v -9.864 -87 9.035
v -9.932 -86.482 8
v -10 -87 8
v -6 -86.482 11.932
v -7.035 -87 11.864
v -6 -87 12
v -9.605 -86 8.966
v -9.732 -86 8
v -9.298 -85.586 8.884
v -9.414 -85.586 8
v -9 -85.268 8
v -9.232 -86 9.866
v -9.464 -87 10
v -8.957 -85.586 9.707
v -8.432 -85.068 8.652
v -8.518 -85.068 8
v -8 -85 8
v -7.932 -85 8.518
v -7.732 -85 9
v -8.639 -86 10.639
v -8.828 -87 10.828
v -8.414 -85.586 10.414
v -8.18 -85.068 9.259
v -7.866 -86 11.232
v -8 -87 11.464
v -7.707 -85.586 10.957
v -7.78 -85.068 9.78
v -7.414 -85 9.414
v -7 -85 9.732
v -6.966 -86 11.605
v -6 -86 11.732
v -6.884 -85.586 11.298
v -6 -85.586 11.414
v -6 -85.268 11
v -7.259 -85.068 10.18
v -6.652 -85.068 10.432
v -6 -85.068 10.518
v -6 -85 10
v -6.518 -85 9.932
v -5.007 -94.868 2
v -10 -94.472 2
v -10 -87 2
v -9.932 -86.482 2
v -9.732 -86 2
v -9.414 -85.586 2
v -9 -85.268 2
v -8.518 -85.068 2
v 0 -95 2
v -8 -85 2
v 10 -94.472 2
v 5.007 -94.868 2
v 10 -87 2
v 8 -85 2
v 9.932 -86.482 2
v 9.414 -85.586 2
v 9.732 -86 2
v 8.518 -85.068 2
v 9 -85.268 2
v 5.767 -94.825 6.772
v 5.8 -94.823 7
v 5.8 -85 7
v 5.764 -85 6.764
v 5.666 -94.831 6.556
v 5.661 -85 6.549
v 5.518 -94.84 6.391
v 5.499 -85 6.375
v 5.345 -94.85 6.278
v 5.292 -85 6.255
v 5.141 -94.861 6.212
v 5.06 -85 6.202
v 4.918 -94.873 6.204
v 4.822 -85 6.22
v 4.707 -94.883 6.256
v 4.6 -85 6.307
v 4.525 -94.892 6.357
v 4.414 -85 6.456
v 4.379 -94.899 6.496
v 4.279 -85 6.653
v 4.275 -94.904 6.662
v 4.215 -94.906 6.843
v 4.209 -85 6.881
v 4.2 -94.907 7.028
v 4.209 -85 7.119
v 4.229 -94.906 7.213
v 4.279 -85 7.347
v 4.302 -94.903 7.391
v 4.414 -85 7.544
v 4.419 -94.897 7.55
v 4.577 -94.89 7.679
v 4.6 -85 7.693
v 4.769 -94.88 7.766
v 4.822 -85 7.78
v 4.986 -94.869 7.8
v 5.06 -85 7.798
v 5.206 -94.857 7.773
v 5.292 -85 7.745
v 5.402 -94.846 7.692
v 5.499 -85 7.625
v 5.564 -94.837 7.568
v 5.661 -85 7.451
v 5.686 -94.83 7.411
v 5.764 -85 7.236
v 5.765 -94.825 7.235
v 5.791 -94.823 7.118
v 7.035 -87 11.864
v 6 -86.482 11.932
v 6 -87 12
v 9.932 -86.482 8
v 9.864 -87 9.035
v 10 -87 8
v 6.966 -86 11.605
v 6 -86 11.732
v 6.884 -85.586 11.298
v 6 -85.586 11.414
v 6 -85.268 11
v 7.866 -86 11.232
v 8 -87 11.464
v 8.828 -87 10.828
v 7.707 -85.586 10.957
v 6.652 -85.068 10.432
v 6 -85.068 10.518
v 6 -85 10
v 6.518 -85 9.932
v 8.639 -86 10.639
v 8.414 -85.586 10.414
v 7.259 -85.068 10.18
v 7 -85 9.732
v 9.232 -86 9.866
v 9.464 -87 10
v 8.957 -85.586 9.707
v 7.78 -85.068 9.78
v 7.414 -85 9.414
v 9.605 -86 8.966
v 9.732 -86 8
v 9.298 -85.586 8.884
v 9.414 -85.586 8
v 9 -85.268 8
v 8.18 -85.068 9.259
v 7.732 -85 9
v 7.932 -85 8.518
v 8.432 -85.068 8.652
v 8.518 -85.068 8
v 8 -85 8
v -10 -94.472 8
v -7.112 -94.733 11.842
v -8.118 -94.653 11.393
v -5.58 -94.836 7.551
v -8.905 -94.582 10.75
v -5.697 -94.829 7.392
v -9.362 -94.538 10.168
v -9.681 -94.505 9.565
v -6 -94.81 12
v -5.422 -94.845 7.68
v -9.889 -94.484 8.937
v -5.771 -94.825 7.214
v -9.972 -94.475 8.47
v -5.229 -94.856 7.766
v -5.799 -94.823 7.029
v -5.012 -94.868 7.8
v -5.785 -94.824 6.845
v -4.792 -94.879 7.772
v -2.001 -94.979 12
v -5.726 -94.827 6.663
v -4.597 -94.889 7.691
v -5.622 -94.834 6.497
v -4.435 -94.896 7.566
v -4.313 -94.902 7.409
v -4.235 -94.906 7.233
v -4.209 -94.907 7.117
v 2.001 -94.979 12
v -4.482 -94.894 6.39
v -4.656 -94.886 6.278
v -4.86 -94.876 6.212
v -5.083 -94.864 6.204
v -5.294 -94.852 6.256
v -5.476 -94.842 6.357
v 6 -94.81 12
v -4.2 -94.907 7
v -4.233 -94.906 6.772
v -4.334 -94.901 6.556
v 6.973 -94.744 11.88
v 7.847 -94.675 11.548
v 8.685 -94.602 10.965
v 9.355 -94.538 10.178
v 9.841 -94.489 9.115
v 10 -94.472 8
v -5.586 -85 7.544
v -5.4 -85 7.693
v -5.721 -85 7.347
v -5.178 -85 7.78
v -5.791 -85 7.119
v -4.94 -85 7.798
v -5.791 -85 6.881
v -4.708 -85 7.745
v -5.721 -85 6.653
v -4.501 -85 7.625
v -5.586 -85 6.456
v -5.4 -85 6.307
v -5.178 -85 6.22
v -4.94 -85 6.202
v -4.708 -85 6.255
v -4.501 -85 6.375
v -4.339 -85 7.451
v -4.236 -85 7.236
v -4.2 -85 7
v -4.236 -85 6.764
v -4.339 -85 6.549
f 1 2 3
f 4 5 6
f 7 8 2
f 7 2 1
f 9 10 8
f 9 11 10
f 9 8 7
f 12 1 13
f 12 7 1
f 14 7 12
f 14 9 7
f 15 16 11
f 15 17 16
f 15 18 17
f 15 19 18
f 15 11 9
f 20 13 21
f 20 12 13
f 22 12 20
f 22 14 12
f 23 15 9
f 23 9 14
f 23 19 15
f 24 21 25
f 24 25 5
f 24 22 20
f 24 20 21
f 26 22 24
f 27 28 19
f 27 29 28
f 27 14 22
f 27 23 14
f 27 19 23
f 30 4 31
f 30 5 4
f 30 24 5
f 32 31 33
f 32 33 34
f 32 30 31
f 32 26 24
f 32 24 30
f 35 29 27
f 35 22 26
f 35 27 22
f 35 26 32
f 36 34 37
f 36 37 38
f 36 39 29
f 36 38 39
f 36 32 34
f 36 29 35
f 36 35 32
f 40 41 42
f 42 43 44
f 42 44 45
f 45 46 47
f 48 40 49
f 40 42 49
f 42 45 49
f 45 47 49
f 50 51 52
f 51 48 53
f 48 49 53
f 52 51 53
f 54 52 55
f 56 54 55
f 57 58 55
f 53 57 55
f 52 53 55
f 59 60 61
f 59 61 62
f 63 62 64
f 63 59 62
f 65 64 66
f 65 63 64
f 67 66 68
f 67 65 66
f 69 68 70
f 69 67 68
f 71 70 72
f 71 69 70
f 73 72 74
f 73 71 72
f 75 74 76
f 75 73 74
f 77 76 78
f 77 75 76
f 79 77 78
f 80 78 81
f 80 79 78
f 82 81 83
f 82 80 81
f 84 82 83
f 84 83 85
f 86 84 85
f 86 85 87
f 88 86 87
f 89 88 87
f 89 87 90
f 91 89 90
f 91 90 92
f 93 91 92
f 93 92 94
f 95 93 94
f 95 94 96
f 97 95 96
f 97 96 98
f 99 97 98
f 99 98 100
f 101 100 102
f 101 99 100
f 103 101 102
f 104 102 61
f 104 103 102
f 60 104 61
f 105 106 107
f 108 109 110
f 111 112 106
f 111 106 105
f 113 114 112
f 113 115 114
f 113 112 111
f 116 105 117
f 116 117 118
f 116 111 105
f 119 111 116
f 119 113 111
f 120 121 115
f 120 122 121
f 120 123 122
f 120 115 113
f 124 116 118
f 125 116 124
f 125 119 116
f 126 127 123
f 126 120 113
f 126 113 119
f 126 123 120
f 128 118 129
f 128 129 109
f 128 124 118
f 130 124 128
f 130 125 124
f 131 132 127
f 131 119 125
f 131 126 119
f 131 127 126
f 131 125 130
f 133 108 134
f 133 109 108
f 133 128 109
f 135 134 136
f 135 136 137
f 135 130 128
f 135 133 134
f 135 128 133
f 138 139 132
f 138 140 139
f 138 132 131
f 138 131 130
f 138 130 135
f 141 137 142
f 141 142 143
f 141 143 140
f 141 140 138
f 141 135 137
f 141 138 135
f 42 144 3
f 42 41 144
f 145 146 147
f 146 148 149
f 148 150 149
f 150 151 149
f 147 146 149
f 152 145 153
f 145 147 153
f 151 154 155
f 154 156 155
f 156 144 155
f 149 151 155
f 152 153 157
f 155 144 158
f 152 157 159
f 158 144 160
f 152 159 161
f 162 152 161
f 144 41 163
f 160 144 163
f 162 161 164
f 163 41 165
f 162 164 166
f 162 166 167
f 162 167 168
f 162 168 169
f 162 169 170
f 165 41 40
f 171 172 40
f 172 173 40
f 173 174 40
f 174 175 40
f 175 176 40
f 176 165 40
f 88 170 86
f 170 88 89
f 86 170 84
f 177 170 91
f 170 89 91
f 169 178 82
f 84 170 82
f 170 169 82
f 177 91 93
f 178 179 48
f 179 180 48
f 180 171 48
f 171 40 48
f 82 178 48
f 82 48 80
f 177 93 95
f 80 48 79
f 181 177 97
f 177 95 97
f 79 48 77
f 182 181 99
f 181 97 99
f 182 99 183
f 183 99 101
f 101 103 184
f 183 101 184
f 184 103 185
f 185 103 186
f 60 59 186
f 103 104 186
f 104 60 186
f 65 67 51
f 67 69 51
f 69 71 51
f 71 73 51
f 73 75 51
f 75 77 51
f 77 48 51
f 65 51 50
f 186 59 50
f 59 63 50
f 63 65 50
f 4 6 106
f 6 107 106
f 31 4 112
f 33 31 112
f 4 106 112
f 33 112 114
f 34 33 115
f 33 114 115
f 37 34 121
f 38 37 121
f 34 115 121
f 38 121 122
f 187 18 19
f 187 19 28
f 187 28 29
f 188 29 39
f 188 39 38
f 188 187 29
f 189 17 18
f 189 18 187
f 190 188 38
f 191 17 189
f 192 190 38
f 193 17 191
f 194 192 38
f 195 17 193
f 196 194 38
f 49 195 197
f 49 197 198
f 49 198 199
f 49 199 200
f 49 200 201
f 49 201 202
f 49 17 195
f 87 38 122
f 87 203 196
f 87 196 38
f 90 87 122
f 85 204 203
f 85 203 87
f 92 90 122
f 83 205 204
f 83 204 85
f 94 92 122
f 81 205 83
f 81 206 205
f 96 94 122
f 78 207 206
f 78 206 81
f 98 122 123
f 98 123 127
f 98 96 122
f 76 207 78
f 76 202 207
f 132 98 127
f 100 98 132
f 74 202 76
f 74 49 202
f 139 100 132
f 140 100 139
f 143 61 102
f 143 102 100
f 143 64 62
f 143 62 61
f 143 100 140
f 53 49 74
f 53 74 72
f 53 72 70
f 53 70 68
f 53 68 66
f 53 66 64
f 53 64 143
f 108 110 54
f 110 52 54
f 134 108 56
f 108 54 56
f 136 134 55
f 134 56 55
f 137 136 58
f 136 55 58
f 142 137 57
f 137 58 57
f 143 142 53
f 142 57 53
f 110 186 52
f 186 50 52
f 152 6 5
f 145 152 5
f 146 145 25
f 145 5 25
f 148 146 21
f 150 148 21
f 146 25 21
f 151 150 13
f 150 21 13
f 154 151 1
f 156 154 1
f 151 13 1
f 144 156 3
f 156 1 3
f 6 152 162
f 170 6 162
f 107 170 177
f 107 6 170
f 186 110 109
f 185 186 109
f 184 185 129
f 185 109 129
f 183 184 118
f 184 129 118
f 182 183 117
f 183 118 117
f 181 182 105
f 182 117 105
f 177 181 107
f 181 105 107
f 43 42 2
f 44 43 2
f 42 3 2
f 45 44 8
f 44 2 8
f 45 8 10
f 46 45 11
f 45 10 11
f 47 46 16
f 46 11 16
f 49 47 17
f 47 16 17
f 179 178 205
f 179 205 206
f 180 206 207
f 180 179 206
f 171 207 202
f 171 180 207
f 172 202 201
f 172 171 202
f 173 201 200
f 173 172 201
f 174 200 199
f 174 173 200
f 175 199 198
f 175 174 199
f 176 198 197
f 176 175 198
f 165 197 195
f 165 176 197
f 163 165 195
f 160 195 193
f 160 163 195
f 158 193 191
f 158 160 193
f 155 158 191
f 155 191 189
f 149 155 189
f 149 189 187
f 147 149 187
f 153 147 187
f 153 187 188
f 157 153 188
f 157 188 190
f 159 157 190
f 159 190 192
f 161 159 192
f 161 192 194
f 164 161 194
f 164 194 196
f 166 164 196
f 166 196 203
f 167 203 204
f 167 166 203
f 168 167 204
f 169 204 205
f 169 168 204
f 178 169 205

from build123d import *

# Parameters (mm, degrees)
CYLINDER011_R     = 0.8
CYLINDER011_DEPTH = 20
CYLINDER010_R     = 0.8
CYLINDER010_DEPTH = 20
BOX002_W          = 20
BOX002_H          = 10
BOX002_DEPTH      = 10
CYLINDER009_R     = 95
CYLINDER009_DEPTH = 10
FILLET006_R       = 4
FILLET007_R       = 2


with BuildPart() as screw004:
    # Cylinder011 → Cylinder011 (new body)
    with BuildSketch(Plane(origin=(5, -100, 5), x_dir=(1, 0, 0), z_dir=(0, 1, 0))):
        Circle(CYLINDER011_R)
    extrude(amount=CYLINDER011_DEPTH)


with BuildPart() as fusion005:
    # Cylinder010 → Cylinder010 (new body)
    with BuildSketch(Plane(origin=(-5, -100, 5), x_dir=(1, 0, 0), z_dir=(0, 1, 0))):
        Circle(CYLINDER010_R)
    extrude(amount=CYLINDER010_DEPTH)

    # Fusion005: union Screw004
    add(screw004.part)


with BuildPart() as cube001:
    # Box002 → Box002 (new body)
    with BuildSketch(Plane(origin=(-10, -95, 0), x_dir=(1, 0, 0), z_dir=(0, 0, 1))):
        with Locations((10, 5)):
            Rectangle(BOX002_W, BOX002_H)
    extrude(amount=BOX002_DEPTH)


with BuildPart() as closetooth:
    # Cylinder009 → Cylinder009 (new body)
    with BuildSketch(Plane.XY):
        Circle(CYLINDER009_R)
    extrude(amount=CYLINDER009_DEPTH)

    # Common: intersect Cube001
    add(cube001.part, mode=Mode.INTERSECT)

    # Fillet006
    fillet006_edges = [closetooth.edges().sort_by_distance(p)[0] for p in [
        (-10, -89.736109, 10),
        (10, -89.736109, 10),
    ]]
    fillet(fillet006_edges, radius=FILLET006_R)

    # Fillet007
    fillet007_edges = [closetooth.edges().sort_by_distance(p)[0] for p in [
        (0, -85, 10),
    ]]
    fillet(fillet007_edges, radius=FILLET007_R)

    # Cut002: cut Fusion005
    add(fusion005.part, mode=Mode.SUBTRACT)


with BuildPart() as closetooth_1:
    # Cut002 placement: moved
    add(closetooth.part.moved(Location((0, 0, 2))))


solid = closetooth_1.part
